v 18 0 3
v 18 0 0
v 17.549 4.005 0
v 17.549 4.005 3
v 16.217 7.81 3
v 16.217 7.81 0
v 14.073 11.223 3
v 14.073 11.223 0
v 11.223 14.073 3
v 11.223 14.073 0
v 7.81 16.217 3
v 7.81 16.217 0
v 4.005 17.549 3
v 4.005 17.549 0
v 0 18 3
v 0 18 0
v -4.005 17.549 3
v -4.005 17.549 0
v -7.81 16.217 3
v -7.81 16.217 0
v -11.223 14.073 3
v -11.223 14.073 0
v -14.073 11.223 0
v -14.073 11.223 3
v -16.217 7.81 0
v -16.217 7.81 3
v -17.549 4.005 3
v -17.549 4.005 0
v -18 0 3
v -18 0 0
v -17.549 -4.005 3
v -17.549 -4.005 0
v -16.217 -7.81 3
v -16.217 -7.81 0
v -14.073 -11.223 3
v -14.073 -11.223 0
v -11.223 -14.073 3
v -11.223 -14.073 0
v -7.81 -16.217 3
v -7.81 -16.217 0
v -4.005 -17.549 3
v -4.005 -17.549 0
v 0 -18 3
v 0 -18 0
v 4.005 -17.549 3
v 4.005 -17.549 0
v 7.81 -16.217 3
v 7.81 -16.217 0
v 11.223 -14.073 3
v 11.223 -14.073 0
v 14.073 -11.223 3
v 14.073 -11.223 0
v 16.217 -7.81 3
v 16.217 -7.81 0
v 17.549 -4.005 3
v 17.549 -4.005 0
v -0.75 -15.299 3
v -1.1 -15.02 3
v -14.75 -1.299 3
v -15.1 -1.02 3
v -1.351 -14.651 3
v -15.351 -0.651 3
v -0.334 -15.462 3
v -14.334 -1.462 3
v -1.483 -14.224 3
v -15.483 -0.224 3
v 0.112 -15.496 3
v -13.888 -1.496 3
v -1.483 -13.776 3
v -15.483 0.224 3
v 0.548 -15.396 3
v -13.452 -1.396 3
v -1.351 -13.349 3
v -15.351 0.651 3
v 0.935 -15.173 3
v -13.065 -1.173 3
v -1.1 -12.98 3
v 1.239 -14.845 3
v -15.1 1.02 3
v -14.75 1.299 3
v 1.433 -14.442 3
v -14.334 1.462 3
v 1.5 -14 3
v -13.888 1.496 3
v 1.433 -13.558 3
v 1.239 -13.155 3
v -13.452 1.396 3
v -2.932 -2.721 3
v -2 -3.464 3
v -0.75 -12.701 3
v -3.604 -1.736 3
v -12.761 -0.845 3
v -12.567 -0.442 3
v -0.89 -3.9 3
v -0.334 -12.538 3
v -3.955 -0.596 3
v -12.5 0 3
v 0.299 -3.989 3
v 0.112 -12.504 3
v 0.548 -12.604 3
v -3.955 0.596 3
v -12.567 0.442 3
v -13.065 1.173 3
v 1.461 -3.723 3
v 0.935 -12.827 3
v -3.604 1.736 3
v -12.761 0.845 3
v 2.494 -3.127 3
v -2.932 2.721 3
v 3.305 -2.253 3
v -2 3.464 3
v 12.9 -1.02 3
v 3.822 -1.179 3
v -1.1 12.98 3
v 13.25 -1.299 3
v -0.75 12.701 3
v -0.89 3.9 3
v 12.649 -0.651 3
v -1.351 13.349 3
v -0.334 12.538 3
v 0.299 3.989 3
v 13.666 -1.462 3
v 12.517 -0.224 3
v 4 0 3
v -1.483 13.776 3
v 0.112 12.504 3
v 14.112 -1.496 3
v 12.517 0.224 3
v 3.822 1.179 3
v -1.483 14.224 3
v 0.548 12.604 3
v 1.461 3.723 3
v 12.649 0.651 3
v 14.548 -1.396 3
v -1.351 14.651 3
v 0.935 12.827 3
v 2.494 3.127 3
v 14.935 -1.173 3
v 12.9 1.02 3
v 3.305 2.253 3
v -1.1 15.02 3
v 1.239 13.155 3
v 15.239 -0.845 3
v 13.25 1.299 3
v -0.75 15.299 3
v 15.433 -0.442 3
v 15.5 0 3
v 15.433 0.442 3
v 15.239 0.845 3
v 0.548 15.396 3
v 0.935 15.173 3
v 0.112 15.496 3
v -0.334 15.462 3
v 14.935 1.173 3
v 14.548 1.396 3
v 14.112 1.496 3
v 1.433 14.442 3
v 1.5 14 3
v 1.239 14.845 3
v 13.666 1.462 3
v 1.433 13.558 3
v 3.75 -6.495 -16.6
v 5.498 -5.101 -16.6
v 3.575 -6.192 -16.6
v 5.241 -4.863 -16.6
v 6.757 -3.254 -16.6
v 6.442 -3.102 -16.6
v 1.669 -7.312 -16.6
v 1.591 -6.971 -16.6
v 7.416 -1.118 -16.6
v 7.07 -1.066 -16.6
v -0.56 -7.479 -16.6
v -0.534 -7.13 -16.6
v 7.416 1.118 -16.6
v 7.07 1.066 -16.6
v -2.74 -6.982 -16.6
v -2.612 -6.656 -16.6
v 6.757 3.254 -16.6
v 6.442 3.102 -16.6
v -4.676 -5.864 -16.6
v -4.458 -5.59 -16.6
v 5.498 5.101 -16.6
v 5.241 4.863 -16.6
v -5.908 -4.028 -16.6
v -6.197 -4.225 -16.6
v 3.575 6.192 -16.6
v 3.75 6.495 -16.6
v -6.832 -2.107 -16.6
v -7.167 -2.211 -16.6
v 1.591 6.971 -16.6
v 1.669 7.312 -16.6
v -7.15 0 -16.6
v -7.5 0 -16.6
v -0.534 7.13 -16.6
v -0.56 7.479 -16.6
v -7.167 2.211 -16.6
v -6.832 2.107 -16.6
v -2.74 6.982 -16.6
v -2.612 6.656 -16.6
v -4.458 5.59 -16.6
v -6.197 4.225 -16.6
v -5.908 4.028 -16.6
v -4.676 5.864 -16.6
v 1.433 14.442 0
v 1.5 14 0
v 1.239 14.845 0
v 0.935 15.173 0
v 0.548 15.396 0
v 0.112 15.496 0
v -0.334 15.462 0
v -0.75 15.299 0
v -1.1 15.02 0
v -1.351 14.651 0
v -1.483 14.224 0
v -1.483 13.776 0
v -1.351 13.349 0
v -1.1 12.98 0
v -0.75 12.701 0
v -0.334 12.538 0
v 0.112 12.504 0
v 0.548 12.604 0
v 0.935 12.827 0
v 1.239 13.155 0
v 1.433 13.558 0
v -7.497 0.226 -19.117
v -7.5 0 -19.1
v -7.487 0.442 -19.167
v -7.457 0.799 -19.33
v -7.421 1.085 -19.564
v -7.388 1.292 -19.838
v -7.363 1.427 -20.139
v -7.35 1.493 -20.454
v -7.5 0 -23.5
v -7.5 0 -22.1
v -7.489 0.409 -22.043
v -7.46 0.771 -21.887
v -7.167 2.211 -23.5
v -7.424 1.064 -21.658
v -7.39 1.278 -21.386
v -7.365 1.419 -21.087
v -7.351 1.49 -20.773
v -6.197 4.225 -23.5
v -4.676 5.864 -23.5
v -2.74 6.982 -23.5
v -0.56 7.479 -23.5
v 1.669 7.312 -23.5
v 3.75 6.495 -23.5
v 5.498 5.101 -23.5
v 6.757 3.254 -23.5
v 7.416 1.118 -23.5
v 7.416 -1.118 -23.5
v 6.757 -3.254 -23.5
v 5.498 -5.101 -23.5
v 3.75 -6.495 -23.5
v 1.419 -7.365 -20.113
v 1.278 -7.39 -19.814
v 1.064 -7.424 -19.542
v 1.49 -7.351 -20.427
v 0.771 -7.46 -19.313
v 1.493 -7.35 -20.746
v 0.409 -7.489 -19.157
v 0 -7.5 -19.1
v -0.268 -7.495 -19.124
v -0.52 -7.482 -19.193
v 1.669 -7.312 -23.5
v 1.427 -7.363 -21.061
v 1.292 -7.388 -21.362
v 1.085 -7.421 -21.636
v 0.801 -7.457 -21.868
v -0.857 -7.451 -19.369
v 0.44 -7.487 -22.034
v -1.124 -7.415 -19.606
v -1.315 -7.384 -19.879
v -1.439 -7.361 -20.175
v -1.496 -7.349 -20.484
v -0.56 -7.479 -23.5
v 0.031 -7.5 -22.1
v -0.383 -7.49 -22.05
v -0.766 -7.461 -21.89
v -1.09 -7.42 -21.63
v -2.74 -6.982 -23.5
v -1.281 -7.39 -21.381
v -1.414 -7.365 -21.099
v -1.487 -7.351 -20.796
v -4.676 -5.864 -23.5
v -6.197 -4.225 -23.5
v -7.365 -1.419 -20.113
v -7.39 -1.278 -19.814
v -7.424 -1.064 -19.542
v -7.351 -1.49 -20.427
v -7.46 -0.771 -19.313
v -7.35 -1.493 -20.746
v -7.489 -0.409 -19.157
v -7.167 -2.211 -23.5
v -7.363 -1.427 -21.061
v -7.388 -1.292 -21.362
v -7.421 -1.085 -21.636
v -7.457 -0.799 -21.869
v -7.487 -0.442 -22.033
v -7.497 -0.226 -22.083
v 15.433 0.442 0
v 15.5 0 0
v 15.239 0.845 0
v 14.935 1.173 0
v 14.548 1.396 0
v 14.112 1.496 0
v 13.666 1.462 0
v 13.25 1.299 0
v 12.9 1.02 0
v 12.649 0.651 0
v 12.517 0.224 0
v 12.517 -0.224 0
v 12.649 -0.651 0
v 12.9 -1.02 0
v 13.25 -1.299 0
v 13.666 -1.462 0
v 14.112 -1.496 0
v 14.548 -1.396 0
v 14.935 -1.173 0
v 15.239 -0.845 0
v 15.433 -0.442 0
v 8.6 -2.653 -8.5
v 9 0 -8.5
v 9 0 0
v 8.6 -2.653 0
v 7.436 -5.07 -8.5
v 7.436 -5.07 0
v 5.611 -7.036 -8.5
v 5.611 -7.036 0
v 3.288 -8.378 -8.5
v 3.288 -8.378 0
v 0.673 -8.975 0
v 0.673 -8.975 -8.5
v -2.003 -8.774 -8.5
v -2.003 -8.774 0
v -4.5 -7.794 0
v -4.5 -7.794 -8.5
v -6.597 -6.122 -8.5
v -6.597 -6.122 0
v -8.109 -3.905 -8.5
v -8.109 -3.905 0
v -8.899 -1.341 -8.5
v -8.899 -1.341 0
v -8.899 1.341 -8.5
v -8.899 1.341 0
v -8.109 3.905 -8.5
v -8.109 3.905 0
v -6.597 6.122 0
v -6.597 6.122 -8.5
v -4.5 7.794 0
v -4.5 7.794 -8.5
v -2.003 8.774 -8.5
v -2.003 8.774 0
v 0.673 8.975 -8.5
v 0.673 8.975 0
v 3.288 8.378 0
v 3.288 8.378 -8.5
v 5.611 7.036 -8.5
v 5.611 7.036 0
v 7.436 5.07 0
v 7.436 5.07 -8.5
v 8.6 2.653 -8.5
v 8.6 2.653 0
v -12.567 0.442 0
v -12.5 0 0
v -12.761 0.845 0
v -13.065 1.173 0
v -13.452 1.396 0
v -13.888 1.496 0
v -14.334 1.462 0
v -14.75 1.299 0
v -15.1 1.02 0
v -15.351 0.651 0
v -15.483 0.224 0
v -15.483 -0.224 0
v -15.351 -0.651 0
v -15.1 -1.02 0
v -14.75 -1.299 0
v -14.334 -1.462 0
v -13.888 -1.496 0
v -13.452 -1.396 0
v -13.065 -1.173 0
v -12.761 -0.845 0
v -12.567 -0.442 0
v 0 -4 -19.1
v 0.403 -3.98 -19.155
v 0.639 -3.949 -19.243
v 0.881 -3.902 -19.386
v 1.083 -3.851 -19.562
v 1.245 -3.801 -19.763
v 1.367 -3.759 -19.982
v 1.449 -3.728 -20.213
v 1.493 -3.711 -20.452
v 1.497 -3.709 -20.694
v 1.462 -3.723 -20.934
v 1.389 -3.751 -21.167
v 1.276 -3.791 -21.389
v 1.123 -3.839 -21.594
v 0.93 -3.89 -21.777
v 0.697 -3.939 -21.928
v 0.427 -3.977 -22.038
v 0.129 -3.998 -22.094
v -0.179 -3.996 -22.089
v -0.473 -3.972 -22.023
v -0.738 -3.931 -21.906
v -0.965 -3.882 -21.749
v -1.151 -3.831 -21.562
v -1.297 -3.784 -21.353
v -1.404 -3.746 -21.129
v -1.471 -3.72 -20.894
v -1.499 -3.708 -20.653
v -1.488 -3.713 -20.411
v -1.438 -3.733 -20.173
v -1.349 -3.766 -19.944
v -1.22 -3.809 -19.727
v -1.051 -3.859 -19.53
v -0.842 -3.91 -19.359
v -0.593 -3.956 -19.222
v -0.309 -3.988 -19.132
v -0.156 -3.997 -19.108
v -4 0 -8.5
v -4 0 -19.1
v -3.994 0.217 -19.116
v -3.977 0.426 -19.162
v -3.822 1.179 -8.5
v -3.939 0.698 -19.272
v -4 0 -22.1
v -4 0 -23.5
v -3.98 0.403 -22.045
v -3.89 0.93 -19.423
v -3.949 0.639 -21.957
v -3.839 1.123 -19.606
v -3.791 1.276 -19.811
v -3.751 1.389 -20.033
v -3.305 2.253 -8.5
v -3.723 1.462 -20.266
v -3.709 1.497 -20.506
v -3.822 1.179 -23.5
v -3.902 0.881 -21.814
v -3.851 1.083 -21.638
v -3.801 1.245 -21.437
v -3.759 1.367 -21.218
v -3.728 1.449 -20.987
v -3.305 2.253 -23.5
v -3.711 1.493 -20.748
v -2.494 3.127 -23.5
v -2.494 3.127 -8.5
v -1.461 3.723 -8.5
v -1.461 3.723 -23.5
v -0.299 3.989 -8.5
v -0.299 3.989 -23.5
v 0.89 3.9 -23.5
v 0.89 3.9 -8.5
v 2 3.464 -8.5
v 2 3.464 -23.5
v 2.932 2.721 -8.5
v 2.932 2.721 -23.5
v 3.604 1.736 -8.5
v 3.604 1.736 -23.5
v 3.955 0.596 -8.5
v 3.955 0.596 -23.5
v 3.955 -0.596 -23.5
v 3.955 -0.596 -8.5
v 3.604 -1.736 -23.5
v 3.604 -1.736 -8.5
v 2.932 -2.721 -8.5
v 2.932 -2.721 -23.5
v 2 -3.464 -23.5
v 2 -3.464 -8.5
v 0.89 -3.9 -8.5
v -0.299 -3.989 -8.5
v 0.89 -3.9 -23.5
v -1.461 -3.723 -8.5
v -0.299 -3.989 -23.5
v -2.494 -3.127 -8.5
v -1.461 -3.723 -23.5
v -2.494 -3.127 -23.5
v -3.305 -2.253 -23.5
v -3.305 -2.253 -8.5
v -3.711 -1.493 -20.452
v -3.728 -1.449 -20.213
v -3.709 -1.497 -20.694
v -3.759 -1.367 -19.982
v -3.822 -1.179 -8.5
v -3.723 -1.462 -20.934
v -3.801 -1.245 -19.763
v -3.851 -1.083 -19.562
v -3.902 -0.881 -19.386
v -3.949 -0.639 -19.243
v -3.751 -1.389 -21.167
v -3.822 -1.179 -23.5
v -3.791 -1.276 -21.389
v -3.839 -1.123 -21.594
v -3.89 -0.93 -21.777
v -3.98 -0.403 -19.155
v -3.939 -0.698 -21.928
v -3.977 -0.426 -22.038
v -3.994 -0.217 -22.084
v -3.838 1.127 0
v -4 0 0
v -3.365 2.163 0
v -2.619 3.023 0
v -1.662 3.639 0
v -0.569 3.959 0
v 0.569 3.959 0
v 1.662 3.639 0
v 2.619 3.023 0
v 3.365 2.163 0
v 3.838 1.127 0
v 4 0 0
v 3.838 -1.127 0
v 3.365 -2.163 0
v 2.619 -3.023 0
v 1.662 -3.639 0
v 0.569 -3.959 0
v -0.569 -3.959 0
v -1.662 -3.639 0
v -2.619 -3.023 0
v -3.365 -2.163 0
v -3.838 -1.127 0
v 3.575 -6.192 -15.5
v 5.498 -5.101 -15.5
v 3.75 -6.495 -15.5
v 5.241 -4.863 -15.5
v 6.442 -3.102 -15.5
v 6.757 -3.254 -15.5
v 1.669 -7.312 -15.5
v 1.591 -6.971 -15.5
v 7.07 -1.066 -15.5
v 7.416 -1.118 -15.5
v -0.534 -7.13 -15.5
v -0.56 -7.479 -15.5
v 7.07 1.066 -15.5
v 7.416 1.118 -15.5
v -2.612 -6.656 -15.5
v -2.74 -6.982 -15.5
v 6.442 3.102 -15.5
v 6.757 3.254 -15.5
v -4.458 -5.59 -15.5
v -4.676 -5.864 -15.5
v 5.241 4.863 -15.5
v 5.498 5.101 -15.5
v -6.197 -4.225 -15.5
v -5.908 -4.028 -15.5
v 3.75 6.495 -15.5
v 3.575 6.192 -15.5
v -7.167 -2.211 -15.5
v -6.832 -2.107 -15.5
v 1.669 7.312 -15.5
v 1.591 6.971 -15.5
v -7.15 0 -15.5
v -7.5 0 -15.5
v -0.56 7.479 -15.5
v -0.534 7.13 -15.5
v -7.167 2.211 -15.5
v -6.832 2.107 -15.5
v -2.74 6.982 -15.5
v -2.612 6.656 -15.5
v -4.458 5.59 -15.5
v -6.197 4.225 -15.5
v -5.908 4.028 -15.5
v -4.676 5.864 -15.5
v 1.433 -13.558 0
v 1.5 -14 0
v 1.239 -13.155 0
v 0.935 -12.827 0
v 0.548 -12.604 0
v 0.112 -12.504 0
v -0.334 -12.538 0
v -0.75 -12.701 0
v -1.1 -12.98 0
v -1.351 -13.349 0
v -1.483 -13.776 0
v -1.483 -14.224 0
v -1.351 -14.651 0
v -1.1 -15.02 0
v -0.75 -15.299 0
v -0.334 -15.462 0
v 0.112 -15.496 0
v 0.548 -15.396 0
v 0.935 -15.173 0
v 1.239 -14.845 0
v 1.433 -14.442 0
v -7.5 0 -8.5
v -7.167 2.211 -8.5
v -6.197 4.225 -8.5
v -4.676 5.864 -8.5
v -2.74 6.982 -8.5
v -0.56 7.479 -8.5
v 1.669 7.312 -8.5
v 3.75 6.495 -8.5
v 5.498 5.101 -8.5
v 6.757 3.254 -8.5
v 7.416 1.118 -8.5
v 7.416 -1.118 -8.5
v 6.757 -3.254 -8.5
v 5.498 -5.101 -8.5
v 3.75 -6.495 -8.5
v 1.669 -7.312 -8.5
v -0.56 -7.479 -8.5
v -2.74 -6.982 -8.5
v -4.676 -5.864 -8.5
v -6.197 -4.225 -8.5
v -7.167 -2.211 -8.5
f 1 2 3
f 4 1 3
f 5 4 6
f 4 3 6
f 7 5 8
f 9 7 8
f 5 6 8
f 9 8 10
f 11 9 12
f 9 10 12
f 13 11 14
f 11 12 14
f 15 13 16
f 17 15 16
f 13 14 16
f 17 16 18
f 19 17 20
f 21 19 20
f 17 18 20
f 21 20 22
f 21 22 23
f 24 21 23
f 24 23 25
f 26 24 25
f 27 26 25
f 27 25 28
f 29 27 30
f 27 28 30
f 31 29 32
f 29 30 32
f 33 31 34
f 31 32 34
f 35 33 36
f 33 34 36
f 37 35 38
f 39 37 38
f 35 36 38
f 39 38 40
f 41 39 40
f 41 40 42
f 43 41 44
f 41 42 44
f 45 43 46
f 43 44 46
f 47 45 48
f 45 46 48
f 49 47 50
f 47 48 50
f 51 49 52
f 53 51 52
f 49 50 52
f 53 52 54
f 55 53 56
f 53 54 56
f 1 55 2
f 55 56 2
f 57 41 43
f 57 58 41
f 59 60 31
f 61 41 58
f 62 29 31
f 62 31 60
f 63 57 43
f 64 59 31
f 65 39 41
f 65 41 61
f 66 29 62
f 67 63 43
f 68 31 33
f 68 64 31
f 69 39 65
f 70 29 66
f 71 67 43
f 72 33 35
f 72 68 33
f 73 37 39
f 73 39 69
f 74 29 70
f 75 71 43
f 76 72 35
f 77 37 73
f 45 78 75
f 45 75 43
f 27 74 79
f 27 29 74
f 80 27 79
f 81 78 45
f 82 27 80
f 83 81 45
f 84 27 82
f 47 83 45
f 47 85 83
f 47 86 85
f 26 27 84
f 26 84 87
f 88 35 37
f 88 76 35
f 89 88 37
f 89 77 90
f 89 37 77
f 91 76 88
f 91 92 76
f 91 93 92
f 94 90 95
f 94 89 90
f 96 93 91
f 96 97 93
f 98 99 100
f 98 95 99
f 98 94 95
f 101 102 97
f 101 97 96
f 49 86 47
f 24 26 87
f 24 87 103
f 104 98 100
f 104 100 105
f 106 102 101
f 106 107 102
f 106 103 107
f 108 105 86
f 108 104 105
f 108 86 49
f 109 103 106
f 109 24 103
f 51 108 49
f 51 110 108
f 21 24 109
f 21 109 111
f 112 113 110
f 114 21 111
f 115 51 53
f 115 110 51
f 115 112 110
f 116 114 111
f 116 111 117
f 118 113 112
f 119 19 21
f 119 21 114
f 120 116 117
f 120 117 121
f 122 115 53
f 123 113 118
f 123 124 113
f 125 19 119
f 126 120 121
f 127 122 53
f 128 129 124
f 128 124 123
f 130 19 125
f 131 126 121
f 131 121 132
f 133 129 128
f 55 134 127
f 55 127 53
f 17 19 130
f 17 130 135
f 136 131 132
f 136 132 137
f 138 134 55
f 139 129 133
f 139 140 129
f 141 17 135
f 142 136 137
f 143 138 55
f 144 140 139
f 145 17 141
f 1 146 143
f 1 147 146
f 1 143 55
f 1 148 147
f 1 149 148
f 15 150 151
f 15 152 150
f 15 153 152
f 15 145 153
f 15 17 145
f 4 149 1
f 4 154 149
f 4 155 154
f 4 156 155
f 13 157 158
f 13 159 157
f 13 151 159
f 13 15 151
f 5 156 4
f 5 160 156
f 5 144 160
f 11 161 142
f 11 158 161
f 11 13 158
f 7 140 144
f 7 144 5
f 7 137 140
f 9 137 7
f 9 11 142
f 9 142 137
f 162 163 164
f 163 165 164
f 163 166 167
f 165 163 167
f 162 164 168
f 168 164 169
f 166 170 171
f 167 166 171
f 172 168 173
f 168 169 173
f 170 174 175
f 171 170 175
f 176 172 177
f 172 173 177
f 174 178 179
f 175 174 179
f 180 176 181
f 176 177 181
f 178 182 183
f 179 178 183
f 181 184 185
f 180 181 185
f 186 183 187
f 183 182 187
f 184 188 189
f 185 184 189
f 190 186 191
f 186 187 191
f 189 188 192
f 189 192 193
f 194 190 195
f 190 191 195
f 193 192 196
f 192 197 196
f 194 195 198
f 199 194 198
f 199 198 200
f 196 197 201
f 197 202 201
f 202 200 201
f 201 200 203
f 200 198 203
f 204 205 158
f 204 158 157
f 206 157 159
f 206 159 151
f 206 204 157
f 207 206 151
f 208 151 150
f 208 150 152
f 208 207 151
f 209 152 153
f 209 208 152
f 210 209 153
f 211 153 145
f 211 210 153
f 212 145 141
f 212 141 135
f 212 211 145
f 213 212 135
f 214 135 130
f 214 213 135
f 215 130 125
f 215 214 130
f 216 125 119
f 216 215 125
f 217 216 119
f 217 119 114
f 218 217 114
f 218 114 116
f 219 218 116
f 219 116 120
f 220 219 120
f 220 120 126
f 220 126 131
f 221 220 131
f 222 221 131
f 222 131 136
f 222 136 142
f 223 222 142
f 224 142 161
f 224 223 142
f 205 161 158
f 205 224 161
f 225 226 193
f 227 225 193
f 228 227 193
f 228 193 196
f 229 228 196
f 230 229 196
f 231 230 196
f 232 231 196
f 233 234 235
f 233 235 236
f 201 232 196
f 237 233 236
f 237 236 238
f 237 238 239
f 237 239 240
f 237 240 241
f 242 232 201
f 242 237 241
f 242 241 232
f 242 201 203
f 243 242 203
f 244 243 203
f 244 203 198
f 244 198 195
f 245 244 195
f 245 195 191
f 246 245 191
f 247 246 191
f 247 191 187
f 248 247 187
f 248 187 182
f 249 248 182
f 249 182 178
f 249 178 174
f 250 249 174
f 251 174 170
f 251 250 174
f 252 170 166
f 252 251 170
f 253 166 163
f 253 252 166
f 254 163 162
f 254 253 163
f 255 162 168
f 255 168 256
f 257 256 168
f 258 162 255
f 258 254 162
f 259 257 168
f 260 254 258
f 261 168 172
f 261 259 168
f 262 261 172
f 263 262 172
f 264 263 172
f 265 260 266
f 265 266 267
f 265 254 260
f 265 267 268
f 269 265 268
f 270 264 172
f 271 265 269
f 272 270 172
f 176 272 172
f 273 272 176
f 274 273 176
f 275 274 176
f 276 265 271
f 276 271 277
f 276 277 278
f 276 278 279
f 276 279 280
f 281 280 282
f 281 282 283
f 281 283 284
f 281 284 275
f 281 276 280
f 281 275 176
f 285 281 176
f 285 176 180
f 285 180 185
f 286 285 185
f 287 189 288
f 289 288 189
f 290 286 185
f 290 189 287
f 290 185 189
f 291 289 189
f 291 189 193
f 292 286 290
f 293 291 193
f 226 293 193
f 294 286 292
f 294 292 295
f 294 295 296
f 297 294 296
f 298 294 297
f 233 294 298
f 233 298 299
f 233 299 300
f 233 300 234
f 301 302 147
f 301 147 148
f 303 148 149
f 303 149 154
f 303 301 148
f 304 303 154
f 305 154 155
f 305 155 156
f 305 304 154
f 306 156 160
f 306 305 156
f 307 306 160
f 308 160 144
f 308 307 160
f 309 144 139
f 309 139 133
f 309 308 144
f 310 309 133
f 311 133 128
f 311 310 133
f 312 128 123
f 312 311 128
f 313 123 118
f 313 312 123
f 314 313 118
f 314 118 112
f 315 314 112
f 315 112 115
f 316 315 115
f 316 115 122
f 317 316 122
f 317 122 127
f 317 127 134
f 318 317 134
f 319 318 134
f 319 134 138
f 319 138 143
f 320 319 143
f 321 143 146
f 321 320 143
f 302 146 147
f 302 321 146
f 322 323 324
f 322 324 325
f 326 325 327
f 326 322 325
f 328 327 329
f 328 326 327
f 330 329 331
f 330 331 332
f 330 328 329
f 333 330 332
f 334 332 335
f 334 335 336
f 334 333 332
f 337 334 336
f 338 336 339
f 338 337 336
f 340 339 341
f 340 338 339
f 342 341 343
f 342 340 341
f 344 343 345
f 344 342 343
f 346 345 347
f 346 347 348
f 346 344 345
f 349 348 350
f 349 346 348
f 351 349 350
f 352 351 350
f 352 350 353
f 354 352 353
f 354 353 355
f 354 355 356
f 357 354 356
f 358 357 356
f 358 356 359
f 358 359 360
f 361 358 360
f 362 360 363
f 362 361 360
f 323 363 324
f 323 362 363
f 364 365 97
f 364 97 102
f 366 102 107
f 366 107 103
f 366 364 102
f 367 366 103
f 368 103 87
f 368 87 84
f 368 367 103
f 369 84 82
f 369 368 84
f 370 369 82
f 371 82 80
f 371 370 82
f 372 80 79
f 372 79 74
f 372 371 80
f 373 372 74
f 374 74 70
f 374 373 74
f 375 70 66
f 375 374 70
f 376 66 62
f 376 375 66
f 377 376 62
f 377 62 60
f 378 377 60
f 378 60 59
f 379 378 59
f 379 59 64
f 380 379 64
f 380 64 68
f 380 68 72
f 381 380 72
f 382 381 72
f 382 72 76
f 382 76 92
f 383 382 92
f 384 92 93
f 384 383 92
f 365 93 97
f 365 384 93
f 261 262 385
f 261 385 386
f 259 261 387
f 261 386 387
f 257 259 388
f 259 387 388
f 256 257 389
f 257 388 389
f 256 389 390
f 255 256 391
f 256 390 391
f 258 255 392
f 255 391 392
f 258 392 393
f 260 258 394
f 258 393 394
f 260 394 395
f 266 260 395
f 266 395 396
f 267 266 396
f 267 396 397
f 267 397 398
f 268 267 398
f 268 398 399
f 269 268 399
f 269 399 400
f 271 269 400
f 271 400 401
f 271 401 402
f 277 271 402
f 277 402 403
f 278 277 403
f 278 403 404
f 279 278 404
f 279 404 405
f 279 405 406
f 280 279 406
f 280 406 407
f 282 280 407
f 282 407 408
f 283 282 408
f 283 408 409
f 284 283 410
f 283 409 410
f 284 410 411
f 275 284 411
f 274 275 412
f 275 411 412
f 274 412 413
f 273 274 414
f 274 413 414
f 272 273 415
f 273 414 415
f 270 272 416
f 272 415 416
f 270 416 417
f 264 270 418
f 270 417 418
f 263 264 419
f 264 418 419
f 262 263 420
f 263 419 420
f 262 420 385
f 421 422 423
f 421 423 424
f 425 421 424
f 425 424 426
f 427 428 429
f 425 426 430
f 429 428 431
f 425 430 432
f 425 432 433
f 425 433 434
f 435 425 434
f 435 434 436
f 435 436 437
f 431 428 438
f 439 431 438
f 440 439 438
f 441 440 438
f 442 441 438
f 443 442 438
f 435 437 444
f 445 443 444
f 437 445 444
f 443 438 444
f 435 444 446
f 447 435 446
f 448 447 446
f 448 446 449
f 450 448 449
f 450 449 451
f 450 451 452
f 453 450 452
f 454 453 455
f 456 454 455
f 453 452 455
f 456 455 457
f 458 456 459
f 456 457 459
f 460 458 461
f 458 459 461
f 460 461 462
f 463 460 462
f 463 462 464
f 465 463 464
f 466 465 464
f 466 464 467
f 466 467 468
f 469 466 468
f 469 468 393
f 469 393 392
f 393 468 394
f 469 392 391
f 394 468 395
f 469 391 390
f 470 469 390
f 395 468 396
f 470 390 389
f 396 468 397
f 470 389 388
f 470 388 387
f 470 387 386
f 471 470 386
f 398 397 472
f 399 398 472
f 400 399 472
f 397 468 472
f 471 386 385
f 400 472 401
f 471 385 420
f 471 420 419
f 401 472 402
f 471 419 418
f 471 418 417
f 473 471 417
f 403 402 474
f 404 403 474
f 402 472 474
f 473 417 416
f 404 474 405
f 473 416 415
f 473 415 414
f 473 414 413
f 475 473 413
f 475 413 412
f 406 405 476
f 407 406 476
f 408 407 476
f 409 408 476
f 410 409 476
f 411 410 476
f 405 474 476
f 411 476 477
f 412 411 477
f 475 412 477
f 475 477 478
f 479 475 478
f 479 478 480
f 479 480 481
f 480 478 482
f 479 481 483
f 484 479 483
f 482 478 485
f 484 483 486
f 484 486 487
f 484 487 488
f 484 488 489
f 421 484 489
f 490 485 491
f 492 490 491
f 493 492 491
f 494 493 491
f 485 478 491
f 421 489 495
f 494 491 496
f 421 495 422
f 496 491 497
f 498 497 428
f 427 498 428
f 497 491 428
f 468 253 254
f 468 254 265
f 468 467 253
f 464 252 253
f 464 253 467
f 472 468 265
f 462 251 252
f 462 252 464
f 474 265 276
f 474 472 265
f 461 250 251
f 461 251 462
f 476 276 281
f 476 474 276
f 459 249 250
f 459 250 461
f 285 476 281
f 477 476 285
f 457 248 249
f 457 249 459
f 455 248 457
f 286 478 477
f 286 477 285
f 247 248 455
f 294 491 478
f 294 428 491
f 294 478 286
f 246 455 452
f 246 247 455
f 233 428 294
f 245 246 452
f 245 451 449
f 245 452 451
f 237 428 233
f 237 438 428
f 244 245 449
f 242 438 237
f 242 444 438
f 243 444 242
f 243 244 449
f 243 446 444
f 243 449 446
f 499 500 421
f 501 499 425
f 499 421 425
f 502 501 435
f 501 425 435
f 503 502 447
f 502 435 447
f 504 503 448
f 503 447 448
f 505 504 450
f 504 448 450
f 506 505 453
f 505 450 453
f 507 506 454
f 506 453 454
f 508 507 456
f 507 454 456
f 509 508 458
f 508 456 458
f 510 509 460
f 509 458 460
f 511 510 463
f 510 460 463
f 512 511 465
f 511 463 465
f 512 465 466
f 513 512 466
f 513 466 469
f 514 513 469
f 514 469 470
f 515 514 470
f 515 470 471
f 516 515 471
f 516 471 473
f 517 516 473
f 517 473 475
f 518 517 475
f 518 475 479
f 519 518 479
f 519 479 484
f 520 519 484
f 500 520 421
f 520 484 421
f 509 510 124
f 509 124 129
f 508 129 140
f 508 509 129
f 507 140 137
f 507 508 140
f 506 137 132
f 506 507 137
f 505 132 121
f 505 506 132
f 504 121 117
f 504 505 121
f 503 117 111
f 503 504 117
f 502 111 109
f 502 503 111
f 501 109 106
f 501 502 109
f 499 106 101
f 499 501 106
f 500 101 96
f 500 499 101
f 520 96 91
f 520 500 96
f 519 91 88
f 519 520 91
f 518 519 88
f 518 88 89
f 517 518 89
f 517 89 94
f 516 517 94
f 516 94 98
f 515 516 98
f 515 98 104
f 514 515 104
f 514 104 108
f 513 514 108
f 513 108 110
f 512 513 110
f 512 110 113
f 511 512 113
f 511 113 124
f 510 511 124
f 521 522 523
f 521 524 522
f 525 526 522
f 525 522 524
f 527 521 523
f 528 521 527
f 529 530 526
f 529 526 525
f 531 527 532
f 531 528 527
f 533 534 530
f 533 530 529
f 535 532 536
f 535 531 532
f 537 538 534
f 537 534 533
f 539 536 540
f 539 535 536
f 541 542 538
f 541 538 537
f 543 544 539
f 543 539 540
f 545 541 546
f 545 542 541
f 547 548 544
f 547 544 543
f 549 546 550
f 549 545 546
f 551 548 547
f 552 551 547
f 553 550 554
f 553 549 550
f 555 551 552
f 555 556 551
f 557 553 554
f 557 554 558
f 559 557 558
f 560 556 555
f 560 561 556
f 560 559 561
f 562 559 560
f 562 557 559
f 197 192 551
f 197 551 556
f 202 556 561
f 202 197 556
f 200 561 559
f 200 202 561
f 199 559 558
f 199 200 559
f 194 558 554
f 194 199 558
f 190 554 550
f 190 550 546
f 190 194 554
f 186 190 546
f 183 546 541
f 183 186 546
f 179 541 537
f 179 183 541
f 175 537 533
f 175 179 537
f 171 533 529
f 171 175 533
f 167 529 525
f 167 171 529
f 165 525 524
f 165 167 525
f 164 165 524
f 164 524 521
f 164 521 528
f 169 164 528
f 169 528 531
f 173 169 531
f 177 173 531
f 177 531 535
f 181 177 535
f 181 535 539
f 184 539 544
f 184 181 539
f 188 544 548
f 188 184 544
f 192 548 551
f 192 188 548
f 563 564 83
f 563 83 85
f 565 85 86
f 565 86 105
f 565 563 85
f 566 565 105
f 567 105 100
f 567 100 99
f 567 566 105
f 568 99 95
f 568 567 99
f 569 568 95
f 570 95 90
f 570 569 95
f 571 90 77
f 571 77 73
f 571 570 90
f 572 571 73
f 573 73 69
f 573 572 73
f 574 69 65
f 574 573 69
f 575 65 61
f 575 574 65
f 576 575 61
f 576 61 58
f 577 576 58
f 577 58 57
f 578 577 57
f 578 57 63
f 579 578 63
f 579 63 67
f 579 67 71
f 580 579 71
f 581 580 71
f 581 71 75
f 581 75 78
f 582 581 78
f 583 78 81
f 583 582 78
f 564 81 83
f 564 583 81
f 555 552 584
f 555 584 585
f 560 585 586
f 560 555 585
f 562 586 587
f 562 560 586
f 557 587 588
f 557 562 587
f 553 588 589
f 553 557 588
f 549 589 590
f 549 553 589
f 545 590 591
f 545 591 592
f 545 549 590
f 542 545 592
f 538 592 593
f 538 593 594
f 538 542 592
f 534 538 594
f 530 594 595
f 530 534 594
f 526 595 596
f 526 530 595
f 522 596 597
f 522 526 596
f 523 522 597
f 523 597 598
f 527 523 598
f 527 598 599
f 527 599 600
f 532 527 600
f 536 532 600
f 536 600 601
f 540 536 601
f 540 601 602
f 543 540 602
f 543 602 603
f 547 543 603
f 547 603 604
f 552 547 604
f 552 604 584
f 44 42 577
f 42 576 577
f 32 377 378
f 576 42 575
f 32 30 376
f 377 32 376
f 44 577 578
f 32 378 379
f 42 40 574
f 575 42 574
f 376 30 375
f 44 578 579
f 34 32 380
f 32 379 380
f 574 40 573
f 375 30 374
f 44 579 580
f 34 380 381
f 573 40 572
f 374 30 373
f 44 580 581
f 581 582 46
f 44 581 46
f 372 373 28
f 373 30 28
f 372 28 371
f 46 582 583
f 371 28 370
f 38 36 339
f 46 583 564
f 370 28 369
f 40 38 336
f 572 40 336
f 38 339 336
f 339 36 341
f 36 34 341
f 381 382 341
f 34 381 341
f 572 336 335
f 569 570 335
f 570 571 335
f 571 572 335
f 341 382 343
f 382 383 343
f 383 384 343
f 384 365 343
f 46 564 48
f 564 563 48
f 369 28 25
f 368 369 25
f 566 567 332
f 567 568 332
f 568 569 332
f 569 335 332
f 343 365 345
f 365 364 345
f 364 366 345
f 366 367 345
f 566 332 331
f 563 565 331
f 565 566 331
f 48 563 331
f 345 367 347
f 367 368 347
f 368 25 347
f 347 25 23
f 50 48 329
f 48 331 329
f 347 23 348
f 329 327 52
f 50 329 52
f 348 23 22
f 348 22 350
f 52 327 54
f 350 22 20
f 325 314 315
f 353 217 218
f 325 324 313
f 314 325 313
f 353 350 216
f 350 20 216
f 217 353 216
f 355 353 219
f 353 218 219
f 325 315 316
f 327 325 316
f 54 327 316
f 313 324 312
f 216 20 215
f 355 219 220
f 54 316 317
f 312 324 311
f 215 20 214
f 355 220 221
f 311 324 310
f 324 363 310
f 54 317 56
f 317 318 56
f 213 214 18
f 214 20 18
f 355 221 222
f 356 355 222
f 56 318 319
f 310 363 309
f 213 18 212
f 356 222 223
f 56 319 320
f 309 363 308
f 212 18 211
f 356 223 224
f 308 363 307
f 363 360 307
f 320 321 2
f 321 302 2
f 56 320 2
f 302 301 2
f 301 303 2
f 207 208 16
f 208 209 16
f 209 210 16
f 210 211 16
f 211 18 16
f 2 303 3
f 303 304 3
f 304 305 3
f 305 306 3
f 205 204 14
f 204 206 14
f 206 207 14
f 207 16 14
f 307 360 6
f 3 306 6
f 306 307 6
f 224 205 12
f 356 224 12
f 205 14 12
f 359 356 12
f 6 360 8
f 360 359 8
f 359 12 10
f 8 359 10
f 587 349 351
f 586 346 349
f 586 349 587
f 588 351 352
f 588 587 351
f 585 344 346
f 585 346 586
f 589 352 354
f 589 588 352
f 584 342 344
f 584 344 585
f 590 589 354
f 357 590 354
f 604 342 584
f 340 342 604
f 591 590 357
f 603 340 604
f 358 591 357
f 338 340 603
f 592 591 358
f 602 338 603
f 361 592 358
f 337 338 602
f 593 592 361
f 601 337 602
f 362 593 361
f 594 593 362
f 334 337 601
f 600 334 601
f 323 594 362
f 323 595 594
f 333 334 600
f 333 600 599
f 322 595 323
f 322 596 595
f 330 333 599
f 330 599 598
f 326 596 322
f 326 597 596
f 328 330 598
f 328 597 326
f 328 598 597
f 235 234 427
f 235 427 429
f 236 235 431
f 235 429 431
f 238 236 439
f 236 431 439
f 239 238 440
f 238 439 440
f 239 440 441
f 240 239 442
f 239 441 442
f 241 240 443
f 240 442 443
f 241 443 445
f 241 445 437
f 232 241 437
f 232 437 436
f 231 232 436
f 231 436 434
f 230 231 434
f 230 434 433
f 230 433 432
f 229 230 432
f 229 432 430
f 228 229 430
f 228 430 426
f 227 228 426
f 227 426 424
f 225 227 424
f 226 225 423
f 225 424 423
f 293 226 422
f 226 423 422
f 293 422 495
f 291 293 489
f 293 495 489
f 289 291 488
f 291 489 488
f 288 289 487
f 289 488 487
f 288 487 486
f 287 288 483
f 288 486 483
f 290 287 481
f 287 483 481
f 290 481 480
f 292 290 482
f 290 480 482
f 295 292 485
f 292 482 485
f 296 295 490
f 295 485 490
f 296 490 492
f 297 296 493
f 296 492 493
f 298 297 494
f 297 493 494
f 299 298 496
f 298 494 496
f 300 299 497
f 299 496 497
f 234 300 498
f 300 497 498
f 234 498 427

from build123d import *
from build123d.topology import SkipClean

# Parameters (mm, degrees)
SKETCH_1_R               = 18
SKETCH_1_R_2             = 1.5
SKETCH_1_R_3             = 4
EXTRUDE_1_DEPTH          = 3
EXTRUDE_START            = 8.5
SKETCH_2_R               = 9
SKETCH_2_R_2             = 4
EXTRUDE_2_DEPTH          = 8.5
EXTRUDE_START_2          = 15
SKETCH_3_R               = 7.5
SKETCH_3_R_2             = 4
EXTRUDE_3_DEPTH          = 15
CUT_EXTRUDE_START        = 1.1
SKETCH_4_R               = 7.5
SKETCH_4_R_2             = 7.15
CUT_EXTRUDE_2_DEPTH      = 1.1
CUT_EXTRUDE_3_REACH      = 36.645
CUT_EXTRUDE_3_END_RADIUS = 7.5
SKETCH_5_R               = 1.5
CUT_EXTRUDE_4_REACH      = 36.645
CUT_EXTRUDE_4_END_RADIUS = 7.5
SKETCH_7_R               = 1.5


with BuildPart() as part:
    # 草图1 → 凸台-拉伸1 (new body)
    with BuildSketch(Plane.XY):
        Circle(SKETCH_1_R)
        with Locations((0, 14)):
            Circle(SKETCH_1_R_2, mode=Mode.SUBTRACT)
        with Locations((14, 0)):
            Circle(SKETCH_1_R_2, mode=Mode.SUBTRACT)
        with Locations((0, -14)):
            Circle(SKETCH_1_R_2, mode=Mode.SUBTRACT)
        with Locations((-14, 0)):
            Circle(SKETCH_1_R_2, mode=Mode.SUBTRACT)
        Circle(SKETCH_1_R_3, mode=Mode.SUBTRACT)
    extrude(amount=EXTRUDE_1_DEPTH)

    # 草图2 → 凸台-拉伸2 (add)
    with SkipClean():  # the faces are left unmerged after this step: merging them gives an invalid solid
        with BuildSketch(Plane(origin=(0, 0, 0), x_dir=(-1, 0, 0), z_dir=(0, 0, -1)).offset(EXTRUDE_START)):
            with Locations(Location((0, 0, 0), (0, 0, 180))):
                Circle(SKETCH_2_R)
            Circle(SKETCH_2_R_2, mode=Mode.SUBTRACT)
        extrude(amount=-EXTRUDE_2_DEPTH)

    # 草图3 → 凸台-拉伸3 (add)
    with SkipClean():  # the faces are left unmerged after this step: merging them gives an invalid solid
        with BuildSketch(Plane(origin=(0, 0, -8.5), x_dir=(-1, 0, 0), z_dir=(0, 0, -1)).offset(EXTRUDE_START_2)):
            Circle(SKETCH_3_R)
            Circle(SKETCH_3_R_2, mode=Mode.SUBTRACT)
        extrude(amount=-EXTRUDE_3_DEPTH)

    # 草图4 → 切除-拉伸2 (cut)
    with SkipClean():  # the faces are left unmerged after this step: merging them gives an invalid solid
        with BuildSketch(Plane(origin=(0, 0, -15.5), x_dir=(-1, 0, 0), z_dir=(0, 0, -1)).offset(CUT_EXTRUDE_START)):
            Circle(SKETCH_4_R)
            Circle(SKETCH_4_R_2, mode=Mode.SUBTRACT)
        extrude(amount=-CUT_EXTRUDE_2_DEPTH, mode=Mode.SUBTRACT)

    # 切除-拉伸3: up to this cylinder (the profile starts inside it)
    with SkipClean():  # the faces are left unmerged after this step: merging them gives an invalid solid
        cut_extrude_3_end = Plane(origin=(0, 0, -20.6), z_dir=(0, 0, 1)) * Cylinder(CUT_EXTRUDE_3_END_RADIUS, 89.29, mode=Mode.PRIVATE)
        # 草图5 → 切除-拉伸3 (cut, up to the surface)
        with BuildSketch(Plane(origin=(0, 0, 0), x_dir=(1, 0, 0), z_dir=(0, 1, 0)), mode=Mode.PRIVATE) as cut_extrude_3_sk1:
            with Locations(Location((0, 20.6, 0), (0, 0, 270))):
                Circle(SKETCH_5_R)
        cut_extrude_3_tool1 = extrude(cut_extrude_3_sk1.sketch, amount=-CUT_EXTRUDE_3_REACH, mode=Mode.PRIVATE) & cut_extrude_3_end
        add(cut_extrude_3_tool1.solids().sort_by_distance((0, 0, -20.6))[0], mode=Mode.SUBTRACT)

    # 切除-拉伸4: up to this cylinder (the profile starts inside it)
    with SkipClean():  # the faces are left unmerged after this step: merging them gives an invalid solid
        cut_extrude_4_end = Plane(origin=(0, 0, -20.6), z_dir=(0, 0, 1)) * Cylinder(CUT_EXTRUDE_4_END_RADIUS, 89.29, mode=Mode.PRIVATE)
        # 草图7 → 切除-拉伸4 (cut, up to the surface)
        with BuildSketch(Plane(origin=(0, 0, 0), x_dir=(0, 0, -1), z_dir=(1, 0, 0)), mode=Mode.PRIVATE) as cut_extrude_4_sk1:
            with Locations((20.6, 0)):
                Circle(SKETCH_7_R)
        cut_extrude_4_tool1 = extrude(cut_extrude_4_sk1.sketch, amount=-CUT_EXTRUDE_4_REACH, mode=Mode.PRIVATE) & cut_extrude_4_end
        add(cut_extrude_4_tool1.solids().sort_by_distance((0, 0, -20.6))[0], mode=Mode.SUBTRACT)


solid = part.part
